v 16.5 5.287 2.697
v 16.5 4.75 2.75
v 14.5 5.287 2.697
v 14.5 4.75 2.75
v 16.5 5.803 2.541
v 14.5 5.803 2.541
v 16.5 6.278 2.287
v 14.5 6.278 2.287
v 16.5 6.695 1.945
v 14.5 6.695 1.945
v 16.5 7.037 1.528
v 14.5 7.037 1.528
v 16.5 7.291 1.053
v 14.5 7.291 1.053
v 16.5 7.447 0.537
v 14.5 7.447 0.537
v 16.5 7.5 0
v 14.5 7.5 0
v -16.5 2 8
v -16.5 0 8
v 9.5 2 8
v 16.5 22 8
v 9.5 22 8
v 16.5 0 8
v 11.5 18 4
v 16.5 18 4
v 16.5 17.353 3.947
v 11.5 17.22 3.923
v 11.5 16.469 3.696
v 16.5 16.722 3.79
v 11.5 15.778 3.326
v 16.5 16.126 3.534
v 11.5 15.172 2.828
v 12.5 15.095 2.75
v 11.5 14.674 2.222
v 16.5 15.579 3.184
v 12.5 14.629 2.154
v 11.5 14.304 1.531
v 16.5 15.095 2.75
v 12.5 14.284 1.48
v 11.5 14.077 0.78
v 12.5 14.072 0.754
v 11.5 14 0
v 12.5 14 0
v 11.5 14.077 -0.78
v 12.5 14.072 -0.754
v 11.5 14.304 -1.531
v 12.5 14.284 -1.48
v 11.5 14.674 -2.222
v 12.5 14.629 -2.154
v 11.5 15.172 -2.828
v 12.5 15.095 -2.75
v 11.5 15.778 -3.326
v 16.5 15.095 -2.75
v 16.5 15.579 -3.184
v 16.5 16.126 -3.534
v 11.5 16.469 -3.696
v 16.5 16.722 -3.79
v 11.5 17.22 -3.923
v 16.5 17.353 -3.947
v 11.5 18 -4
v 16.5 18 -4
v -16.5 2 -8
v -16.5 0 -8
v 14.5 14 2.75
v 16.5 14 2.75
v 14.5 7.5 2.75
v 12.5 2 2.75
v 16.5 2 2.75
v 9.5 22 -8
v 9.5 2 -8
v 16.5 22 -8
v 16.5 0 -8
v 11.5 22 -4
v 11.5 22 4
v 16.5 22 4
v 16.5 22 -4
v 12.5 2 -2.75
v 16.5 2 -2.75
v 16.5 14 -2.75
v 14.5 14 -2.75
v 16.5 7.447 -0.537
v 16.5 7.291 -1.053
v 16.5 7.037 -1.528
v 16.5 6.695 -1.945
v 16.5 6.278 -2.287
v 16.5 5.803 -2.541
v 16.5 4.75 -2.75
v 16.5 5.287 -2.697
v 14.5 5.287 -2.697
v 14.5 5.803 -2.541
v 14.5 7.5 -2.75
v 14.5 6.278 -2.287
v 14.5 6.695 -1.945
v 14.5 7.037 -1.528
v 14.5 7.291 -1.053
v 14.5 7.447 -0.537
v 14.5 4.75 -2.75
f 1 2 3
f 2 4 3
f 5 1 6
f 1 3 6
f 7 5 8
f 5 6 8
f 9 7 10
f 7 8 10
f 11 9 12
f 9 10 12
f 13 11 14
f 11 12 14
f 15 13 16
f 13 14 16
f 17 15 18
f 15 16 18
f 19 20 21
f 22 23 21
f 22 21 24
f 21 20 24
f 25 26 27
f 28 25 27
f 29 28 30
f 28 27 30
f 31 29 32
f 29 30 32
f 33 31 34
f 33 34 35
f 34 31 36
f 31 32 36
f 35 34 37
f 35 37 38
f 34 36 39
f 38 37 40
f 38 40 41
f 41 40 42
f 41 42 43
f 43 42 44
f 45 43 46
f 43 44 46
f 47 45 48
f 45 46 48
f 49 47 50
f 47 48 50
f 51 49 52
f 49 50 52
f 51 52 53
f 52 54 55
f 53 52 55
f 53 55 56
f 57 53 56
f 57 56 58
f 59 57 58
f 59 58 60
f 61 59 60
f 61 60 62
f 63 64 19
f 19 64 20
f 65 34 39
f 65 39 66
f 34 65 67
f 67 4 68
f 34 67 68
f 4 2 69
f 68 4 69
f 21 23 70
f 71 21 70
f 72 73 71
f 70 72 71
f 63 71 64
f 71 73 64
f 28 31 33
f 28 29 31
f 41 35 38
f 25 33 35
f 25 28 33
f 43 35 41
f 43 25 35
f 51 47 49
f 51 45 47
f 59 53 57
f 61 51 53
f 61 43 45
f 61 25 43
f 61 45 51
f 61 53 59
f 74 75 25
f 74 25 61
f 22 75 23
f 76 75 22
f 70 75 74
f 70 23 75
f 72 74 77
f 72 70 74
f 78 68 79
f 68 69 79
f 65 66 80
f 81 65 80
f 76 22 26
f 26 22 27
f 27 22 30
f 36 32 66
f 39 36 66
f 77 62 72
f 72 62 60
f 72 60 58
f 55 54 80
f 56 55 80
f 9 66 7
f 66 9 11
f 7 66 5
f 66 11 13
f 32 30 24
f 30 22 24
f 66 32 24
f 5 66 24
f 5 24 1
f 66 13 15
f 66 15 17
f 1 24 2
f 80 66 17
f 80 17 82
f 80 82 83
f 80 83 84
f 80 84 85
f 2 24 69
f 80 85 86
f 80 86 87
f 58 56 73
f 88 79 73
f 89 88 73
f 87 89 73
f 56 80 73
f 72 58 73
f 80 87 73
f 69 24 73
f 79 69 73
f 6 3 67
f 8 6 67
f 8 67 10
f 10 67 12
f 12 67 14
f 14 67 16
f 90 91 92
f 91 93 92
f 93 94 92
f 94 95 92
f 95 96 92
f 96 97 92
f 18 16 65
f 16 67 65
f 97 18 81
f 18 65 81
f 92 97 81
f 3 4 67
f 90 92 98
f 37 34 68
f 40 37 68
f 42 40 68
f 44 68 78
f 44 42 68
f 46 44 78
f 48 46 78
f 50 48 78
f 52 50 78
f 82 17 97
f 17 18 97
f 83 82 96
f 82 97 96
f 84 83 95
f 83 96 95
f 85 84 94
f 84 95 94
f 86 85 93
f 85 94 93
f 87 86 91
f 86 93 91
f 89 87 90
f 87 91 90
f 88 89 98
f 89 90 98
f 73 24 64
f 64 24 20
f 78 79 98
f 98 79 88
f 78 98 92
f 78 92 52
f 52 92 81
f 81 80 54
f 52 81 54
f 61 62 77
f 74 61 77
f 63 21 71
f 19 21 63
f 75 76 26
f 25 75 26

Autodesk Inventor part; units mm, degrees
ref_plane "YZ Plane" through (0, 0, 0) normal (1, 0, 0) x (0, 1, 0)
ref_plane "XZ Plane" through (0, 0, 0) normal (0, 1, 0) x (-1, 0, 0)
ref_plane "XY Plane" through (0, 0, 0) normal (0, 0, 1) x (1, 0, 0)
sketch "Sketch1" plane through (0, 0, 0) normal (0, 1, 0) x (-1, 0, 0)
  line L0 (16.5, 8) -> (-16.5, 8)
  line L1 (-16.5, 8) -> (-16.5, -8)
  line L2 (-16.5, -8) -> (16.5, -8)
  line L3 (16.5, -8) -> (16.5, 8)
  line L4 (16.5, 8) -> (-16.5, -8) construction
  line L5 (-16.5, 8) -> (16.5, -8) construction
  point P0 (0, 0)
  dimension "d0" = 16
  dimension "d1" = 33
extrude "Extrusion1" add sketch "Sketch1" along normal blind 2
sketch "Sketch2" plane through (0, 2, 0) normal (0, 1, 0) x (1, 0, 0)
  line L0 (-16.5, -8) -> (16.5, -8) projected
  line L1 (16.5, -8) -> (16.5, 8) projected
  line L2 (16.5, 8) -> (-16.5, 8) projected
  line L3 (-16.5, 8) -> (-16.5, -8) projected
  line L4 (16.5, -8) -> (9.5, -8)
  line L5 (9.5, -8) -> (9.5, 8)
  line L6 (9.5, 8) -> (16.5, 8)
  line L7 (16.5, 8) -> (16.5, -8)
  point P0 (0, 0)
  dimension "d4" = 7
extrude "Extrusion2" add sketch "Sketch2" along normal blind 20 contours L5 L2 L1 L0
sketch "Sketch3" plane through (16.5, 0, 8) normal (1, 0, 0) x (0, 0, -1)
  line L0 (0, 0) -> (16, 0) projected
  line L1 (16, 0) -> (16, 22) projected
  line L2 (0, 22) -> (16, 22) projected
  line L3 (0, 0) -> (0, 22) projected
  line L4 (10.75, 18) -> (5.25, 18)
  line L5 (5.25, 18) -> (5.25, 2)
  line L6 (5.25, 2) -> (10.75, 2)
  line L7 (10.75, 2) -> (10.75, 18)
  line L8 (10.75, 18) -> (5.25, 2) construction
  line L9 (5.25, 18) -> (10.75, 2) construction
  circle A0 centre (8, 18) radius 4
  line L10 (0, 22) -> (16, 22) projected
  line L11 (4, 18) -> (12, 18)
  line L12 (12, 18) -> (12, 22)
  line L13 (12, 22) -> (4, 22)
  line L14 (4, 22) -> (4, 18)
  point P0 (8, 0)
  point P1 (8, 10)
  dimension "d11" = 8
  dimension "d7" = 4
  dimension "d8" = 16
  dimension "d9" = 5.5
  dimension "d10" = 8
extrude "Extrusion3" cut sketch "Sketch3" against normal blind 4 contours A0 L7 L6 L5 | L5 L4 L7 A0
extrude "Extrusion4" cut sketch "Sketch3" against normal blind 5 contours L2 A0 L14 | L12 A0 L2 | A0 L11 L4 | L11 L5 A0 | A0 L7 L11 | L5 L4 L7 A0
sketch "Sketch4" plane through (16.5, 0, 8) normal (1, 0, 0) x (0, 0, -1)
  line L0 (5.25, 2) -> (5.25, 15.0953) projected
  line L1 (10.75, 15.0953) -> (10.75, 2) projected
  line L2 (5.25, 14) -> (10.75, 14)
  line L3 (10.75, 14) -> (10.75, 7.5)
  line L4 (10.75, 7.5) -> (5.25, 7.5)
  line L5 (5.25, 7.5) -> (5.25, 14)
  line L6 (10.75, 2) -> (5.25, 2) projected
  point P0 (8, 0)
  dimension "d16" = 5.5
  dimension "d17" = 6.5
extrude "Extrusion5" add sketch "Sketch4" against normal blind 2 contours L0 L2 L1 L4
fillet "Fillet1" radius 2.75 2 edges at (15.5, 7.5, -2.75) (15.5, 7.5, 2.75)
properties part number "leg_hind_upper_joint"
